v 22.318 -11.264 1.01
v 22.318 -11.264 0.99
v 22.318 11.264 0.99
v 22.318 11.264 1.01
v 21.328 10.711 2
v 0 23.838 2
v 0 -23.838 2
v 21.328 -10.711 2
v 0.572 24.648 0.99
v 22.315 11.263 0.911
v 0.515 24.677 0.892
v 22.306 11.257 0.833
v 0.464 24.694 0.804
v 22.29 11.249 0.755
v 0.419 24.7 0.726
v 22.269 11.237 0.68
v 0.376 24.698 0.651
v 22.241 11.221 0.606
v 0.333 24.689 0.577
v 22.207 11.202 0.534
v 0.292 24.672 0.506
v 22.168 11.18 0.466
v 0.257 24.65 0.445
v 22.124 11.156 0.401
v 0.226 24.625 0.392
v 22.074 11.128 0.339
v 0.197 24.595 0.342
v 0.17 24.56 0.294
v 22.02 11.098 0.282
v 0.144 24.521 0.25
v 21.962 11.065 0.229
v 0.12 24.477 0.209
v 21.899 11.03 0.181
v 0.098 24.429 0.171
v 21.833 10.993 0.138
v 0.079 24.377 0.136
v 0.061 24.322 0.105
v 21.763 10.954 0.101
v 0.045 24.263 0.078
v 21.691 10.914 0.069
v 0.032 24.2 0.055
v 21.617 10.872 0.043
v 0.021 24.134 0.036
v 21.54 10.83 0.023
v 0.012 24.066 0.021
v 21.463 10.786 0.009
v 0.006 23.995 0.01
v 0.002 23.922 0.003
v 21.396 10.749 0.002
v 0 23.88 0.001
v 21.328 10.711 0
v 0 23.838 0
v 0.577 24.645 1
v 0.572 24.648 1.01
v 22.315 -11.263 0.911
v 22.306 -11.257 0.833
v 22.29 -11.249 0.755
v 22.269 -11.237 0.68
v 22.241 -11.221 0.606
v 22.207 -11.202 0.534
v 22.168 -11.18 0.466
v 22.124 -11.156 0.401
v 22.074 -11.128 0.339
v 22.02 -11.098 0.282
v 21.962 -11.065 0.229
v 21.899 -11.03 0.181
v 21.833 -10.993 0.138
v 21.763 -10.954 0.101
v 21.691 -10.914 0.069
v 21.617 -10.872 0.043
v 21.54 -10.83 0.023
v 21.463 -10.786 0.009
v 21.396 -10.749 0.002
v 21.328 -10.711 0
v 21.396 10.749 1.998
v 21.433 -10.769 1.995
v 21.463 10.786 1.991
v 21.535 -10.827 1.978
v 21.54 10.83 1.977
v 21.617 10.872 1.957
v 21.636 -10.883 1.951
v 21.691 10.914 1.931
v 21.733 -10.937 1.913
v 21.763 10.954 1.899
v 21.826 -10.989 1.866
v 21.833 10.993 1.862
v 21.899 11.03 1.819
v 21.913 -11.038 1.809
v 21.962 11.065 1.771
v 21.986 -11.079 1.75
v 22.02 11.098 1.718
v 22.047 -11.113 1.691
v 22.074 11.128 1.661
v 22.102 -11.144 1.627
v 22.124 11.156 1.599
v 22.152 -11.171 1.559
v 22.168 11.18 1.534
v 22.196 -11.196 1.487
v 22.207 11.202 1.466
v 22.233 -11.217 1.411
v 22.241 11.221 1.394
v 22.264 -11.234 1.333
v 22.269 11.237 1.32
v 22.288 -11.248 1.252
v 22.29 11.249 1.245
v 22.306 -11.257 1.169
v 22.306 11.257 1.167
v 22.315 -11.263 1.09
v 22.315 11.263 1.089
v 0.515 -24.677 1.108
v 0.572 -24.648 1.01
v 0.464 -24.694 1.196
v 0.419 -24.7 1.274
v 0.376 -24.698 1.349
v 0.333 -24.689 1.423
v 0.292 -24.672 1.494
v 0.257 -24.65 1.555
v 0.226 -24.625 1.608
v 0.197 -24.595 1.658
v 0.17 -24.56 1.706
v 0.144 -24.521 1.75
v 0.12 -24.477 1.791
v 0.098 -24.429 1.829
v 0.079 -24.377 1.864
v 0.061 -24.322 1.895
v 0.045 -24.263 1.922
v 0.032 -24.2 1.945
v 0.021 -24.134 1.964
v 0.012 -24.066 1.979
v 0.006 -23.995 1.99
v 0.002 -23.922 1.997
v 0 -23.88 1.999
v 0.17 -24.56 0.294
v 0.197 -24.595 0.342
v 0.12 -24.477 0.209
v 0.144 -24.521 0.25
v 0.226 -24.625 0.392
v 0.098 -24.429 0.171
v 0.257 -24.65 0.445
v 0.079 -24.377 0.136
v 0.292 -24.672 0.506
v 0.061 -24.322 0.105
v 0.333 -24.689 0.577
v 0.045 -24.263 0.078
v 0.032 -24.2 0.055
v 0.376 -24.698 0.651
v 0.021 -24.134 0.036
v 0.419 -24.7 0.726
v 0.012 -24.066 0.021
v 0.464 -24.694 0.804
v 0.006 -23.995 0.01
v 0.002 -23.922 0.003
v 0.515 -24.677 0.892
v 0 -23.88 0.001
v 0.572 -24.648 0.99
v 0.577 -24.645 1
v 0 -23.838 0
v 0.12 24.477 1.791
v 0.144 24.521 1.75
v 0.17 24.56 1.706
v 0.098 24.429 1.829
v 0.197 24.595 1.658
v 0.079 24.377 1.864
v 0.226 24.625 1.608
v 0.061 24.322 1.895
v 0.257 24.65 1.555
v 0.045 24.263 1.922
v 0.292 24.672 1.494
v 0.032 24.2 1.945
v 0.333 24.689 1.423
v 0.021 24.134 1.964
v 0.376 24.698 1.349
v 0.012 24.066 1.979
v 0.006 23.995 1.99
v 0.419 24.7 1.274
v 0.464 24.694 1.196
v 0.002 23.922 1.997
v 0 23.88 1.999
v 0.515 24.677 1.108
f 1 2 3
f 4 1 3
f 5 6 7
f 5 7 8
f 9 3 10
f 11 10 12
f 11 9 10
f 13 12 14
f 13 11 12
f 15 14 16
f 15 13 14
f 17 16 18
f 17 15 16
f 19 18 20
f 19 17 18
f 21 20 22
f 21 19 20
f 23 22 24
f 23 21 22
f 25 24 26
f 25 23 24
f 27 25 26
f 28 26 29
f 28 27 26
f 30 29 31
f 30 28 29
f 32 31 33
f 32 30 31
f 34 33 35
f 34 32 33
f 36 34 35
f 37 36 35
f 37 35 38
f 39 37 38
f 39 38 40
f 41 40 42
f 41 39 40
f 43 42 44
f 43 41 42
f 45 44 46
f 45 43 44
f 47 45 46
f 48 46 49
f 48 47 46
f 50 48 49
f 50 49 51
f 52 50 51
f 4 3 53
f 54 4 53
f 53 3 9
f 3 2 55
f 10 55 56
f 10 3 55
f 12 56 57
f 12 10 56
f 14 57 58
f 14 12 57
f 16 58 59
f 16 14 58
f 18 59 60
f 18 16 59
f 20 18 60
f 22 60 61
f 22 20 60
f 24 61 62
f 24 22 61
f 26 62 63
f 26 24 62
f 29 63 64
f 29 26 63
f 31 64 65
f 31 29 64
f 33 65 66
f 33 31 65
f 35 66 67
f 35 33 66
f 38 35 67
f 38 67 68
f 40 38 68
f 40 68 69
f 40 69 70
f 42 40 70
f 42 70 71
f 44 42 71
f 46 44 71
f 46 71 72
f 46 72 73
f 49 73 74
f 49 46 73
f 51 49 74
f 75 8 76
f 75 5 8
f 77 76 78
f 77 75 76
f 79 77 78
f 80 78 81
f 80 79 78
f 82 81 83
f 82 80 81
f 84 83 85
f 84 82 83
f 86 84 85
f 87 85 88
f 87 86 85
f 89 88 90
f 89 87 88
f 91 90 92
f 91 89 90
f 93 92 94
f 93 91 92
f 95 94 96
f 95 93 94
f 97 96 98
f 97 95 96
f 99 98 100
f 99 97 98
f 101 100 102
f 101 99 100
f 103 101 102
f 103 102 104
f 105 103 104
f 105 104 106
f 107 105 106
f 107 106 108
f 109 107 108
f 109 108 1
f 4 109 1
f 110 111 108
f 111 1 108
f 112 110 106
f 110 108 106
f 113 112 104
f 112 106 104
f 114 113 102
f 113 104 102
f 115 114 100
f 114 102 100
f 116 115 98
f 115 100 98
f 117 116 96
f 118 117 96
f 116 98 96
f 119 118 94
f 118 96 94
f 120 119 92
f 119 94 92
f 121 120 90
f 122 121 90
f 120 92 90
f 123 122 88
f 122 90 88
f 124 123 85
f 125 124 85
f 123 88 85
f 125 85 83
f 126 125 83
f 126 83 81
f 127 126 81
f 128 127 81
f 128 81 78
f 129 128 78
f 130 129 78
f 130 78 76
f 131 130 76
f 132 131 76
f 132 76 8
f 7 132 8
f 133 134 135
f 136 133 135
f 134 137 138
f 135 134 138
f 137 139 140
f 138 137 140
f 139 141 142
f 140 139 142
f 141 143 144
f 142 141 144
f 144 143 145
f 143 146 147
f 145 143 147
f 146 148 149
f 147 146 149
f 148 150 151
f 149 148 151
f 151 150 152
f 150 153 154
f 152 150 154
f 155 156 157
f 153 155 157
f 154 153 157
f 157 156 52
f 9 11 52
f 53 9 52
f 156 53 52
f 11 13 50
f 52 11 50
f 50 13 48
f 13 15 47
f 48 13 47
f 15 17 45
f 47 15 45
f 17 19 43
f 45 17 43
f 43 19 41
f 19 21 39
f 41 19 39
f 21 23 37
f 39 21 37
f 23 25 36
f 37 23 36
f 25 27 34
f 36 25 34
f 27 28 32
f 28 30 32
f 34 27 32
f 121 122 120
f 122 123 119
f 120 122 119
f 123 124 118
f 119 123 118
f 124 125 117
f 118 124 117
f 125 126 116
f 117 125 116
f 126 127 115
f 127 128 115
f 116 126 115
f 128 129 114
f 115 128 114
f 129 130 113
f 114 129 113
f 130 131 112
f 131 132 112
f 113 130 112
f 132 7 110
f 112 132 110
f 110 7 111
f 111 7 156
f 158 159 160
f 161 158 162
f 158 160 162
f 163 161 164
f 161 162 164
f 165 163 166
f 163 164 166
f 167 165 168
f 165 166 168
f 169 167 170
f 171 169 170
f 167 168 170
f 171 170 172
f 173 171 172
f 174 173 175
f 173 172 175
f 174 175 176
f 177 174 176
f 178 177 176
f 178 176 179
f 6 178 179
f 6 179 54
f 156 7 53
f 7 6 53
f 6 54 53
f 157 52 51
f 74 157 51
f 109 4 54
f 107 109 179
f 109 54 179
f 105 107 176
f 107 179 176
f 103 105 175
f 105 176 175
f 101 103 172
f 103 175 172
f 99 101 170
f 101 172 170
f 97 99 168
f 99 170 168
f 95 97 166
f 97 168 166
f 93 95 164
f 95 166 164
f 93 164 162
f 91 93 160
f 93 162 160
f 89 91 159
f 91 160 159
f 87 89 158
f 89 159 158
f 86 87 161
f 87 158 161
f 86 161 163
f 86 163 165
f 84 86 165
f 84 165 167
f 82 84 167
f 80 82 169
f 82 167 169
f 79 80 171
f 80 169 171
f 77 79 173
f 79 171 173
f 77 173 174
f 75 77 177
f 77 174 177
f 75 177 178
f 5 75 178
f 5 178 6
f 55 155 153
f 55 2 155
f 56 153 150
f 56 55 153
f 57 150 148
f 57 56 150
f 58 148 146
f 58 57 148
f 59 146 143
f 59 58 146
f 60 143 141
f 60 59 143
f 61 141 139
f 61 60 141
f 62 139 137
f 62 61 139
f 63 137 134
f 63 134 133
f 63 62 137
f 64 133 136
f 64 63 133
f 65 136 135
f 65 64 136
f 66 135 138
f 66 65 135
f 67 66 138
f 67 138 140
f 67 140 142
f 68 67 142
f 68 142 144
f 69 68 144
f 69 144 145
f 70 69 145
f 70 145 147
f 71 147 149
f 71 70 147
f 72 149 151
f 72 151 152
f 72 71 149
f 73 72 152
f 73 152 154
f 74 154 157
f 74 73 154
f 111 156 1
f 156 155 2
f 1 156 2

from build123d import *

# Parameters (mm, degrees)
PAD_DEPTH         = 2
POCKET_DEPTH      = 25
POCKET_DEPTH_BACK = -25
FILLET_R          = 0.99


with BuildPart() as part:
    # Sketch → Pad (new body)
    with BuildSketch(Plane.XY):
        Polygon((0, -25), (22.318456, -11.264392), (22.318456, 11.264392), (0, 25), align=None)
    extrude(amount=PAD_DEPTH)

    # Sketch001 → Pocket (cut, two sides)
    with BuildSketch(Plane.XZ) as pocket_sk:
        Polygon((0, 2), (0.57735, 1), (0, 0), (-0.786644, 0.221257), (-0.914664, 1.821517), align=None)
    extrude(amount=-POCKET_DEPTH, mode=Mode.SUBTRACT)
    extrude(pocket_sk.sketch, amount=-POCKET_DEPTH_BACK, mode=Mode.SUBTRACT)

    # Fillet
    fillet_edges = [part.edges().sort_by_distance(p)[0] for p in [
        (11.159228, 18.132196, 0),
        (11.159228, 18.132196, 2),
        (22.318456, 0, 0),
        (11.159228, -18.132196, 0),
        (22.318456, 0, 2),
        (11.159228, -18.132196, 2),
    ]]
    fillet(fillet_edges, radius=FILLET_R)


solid = part.part
